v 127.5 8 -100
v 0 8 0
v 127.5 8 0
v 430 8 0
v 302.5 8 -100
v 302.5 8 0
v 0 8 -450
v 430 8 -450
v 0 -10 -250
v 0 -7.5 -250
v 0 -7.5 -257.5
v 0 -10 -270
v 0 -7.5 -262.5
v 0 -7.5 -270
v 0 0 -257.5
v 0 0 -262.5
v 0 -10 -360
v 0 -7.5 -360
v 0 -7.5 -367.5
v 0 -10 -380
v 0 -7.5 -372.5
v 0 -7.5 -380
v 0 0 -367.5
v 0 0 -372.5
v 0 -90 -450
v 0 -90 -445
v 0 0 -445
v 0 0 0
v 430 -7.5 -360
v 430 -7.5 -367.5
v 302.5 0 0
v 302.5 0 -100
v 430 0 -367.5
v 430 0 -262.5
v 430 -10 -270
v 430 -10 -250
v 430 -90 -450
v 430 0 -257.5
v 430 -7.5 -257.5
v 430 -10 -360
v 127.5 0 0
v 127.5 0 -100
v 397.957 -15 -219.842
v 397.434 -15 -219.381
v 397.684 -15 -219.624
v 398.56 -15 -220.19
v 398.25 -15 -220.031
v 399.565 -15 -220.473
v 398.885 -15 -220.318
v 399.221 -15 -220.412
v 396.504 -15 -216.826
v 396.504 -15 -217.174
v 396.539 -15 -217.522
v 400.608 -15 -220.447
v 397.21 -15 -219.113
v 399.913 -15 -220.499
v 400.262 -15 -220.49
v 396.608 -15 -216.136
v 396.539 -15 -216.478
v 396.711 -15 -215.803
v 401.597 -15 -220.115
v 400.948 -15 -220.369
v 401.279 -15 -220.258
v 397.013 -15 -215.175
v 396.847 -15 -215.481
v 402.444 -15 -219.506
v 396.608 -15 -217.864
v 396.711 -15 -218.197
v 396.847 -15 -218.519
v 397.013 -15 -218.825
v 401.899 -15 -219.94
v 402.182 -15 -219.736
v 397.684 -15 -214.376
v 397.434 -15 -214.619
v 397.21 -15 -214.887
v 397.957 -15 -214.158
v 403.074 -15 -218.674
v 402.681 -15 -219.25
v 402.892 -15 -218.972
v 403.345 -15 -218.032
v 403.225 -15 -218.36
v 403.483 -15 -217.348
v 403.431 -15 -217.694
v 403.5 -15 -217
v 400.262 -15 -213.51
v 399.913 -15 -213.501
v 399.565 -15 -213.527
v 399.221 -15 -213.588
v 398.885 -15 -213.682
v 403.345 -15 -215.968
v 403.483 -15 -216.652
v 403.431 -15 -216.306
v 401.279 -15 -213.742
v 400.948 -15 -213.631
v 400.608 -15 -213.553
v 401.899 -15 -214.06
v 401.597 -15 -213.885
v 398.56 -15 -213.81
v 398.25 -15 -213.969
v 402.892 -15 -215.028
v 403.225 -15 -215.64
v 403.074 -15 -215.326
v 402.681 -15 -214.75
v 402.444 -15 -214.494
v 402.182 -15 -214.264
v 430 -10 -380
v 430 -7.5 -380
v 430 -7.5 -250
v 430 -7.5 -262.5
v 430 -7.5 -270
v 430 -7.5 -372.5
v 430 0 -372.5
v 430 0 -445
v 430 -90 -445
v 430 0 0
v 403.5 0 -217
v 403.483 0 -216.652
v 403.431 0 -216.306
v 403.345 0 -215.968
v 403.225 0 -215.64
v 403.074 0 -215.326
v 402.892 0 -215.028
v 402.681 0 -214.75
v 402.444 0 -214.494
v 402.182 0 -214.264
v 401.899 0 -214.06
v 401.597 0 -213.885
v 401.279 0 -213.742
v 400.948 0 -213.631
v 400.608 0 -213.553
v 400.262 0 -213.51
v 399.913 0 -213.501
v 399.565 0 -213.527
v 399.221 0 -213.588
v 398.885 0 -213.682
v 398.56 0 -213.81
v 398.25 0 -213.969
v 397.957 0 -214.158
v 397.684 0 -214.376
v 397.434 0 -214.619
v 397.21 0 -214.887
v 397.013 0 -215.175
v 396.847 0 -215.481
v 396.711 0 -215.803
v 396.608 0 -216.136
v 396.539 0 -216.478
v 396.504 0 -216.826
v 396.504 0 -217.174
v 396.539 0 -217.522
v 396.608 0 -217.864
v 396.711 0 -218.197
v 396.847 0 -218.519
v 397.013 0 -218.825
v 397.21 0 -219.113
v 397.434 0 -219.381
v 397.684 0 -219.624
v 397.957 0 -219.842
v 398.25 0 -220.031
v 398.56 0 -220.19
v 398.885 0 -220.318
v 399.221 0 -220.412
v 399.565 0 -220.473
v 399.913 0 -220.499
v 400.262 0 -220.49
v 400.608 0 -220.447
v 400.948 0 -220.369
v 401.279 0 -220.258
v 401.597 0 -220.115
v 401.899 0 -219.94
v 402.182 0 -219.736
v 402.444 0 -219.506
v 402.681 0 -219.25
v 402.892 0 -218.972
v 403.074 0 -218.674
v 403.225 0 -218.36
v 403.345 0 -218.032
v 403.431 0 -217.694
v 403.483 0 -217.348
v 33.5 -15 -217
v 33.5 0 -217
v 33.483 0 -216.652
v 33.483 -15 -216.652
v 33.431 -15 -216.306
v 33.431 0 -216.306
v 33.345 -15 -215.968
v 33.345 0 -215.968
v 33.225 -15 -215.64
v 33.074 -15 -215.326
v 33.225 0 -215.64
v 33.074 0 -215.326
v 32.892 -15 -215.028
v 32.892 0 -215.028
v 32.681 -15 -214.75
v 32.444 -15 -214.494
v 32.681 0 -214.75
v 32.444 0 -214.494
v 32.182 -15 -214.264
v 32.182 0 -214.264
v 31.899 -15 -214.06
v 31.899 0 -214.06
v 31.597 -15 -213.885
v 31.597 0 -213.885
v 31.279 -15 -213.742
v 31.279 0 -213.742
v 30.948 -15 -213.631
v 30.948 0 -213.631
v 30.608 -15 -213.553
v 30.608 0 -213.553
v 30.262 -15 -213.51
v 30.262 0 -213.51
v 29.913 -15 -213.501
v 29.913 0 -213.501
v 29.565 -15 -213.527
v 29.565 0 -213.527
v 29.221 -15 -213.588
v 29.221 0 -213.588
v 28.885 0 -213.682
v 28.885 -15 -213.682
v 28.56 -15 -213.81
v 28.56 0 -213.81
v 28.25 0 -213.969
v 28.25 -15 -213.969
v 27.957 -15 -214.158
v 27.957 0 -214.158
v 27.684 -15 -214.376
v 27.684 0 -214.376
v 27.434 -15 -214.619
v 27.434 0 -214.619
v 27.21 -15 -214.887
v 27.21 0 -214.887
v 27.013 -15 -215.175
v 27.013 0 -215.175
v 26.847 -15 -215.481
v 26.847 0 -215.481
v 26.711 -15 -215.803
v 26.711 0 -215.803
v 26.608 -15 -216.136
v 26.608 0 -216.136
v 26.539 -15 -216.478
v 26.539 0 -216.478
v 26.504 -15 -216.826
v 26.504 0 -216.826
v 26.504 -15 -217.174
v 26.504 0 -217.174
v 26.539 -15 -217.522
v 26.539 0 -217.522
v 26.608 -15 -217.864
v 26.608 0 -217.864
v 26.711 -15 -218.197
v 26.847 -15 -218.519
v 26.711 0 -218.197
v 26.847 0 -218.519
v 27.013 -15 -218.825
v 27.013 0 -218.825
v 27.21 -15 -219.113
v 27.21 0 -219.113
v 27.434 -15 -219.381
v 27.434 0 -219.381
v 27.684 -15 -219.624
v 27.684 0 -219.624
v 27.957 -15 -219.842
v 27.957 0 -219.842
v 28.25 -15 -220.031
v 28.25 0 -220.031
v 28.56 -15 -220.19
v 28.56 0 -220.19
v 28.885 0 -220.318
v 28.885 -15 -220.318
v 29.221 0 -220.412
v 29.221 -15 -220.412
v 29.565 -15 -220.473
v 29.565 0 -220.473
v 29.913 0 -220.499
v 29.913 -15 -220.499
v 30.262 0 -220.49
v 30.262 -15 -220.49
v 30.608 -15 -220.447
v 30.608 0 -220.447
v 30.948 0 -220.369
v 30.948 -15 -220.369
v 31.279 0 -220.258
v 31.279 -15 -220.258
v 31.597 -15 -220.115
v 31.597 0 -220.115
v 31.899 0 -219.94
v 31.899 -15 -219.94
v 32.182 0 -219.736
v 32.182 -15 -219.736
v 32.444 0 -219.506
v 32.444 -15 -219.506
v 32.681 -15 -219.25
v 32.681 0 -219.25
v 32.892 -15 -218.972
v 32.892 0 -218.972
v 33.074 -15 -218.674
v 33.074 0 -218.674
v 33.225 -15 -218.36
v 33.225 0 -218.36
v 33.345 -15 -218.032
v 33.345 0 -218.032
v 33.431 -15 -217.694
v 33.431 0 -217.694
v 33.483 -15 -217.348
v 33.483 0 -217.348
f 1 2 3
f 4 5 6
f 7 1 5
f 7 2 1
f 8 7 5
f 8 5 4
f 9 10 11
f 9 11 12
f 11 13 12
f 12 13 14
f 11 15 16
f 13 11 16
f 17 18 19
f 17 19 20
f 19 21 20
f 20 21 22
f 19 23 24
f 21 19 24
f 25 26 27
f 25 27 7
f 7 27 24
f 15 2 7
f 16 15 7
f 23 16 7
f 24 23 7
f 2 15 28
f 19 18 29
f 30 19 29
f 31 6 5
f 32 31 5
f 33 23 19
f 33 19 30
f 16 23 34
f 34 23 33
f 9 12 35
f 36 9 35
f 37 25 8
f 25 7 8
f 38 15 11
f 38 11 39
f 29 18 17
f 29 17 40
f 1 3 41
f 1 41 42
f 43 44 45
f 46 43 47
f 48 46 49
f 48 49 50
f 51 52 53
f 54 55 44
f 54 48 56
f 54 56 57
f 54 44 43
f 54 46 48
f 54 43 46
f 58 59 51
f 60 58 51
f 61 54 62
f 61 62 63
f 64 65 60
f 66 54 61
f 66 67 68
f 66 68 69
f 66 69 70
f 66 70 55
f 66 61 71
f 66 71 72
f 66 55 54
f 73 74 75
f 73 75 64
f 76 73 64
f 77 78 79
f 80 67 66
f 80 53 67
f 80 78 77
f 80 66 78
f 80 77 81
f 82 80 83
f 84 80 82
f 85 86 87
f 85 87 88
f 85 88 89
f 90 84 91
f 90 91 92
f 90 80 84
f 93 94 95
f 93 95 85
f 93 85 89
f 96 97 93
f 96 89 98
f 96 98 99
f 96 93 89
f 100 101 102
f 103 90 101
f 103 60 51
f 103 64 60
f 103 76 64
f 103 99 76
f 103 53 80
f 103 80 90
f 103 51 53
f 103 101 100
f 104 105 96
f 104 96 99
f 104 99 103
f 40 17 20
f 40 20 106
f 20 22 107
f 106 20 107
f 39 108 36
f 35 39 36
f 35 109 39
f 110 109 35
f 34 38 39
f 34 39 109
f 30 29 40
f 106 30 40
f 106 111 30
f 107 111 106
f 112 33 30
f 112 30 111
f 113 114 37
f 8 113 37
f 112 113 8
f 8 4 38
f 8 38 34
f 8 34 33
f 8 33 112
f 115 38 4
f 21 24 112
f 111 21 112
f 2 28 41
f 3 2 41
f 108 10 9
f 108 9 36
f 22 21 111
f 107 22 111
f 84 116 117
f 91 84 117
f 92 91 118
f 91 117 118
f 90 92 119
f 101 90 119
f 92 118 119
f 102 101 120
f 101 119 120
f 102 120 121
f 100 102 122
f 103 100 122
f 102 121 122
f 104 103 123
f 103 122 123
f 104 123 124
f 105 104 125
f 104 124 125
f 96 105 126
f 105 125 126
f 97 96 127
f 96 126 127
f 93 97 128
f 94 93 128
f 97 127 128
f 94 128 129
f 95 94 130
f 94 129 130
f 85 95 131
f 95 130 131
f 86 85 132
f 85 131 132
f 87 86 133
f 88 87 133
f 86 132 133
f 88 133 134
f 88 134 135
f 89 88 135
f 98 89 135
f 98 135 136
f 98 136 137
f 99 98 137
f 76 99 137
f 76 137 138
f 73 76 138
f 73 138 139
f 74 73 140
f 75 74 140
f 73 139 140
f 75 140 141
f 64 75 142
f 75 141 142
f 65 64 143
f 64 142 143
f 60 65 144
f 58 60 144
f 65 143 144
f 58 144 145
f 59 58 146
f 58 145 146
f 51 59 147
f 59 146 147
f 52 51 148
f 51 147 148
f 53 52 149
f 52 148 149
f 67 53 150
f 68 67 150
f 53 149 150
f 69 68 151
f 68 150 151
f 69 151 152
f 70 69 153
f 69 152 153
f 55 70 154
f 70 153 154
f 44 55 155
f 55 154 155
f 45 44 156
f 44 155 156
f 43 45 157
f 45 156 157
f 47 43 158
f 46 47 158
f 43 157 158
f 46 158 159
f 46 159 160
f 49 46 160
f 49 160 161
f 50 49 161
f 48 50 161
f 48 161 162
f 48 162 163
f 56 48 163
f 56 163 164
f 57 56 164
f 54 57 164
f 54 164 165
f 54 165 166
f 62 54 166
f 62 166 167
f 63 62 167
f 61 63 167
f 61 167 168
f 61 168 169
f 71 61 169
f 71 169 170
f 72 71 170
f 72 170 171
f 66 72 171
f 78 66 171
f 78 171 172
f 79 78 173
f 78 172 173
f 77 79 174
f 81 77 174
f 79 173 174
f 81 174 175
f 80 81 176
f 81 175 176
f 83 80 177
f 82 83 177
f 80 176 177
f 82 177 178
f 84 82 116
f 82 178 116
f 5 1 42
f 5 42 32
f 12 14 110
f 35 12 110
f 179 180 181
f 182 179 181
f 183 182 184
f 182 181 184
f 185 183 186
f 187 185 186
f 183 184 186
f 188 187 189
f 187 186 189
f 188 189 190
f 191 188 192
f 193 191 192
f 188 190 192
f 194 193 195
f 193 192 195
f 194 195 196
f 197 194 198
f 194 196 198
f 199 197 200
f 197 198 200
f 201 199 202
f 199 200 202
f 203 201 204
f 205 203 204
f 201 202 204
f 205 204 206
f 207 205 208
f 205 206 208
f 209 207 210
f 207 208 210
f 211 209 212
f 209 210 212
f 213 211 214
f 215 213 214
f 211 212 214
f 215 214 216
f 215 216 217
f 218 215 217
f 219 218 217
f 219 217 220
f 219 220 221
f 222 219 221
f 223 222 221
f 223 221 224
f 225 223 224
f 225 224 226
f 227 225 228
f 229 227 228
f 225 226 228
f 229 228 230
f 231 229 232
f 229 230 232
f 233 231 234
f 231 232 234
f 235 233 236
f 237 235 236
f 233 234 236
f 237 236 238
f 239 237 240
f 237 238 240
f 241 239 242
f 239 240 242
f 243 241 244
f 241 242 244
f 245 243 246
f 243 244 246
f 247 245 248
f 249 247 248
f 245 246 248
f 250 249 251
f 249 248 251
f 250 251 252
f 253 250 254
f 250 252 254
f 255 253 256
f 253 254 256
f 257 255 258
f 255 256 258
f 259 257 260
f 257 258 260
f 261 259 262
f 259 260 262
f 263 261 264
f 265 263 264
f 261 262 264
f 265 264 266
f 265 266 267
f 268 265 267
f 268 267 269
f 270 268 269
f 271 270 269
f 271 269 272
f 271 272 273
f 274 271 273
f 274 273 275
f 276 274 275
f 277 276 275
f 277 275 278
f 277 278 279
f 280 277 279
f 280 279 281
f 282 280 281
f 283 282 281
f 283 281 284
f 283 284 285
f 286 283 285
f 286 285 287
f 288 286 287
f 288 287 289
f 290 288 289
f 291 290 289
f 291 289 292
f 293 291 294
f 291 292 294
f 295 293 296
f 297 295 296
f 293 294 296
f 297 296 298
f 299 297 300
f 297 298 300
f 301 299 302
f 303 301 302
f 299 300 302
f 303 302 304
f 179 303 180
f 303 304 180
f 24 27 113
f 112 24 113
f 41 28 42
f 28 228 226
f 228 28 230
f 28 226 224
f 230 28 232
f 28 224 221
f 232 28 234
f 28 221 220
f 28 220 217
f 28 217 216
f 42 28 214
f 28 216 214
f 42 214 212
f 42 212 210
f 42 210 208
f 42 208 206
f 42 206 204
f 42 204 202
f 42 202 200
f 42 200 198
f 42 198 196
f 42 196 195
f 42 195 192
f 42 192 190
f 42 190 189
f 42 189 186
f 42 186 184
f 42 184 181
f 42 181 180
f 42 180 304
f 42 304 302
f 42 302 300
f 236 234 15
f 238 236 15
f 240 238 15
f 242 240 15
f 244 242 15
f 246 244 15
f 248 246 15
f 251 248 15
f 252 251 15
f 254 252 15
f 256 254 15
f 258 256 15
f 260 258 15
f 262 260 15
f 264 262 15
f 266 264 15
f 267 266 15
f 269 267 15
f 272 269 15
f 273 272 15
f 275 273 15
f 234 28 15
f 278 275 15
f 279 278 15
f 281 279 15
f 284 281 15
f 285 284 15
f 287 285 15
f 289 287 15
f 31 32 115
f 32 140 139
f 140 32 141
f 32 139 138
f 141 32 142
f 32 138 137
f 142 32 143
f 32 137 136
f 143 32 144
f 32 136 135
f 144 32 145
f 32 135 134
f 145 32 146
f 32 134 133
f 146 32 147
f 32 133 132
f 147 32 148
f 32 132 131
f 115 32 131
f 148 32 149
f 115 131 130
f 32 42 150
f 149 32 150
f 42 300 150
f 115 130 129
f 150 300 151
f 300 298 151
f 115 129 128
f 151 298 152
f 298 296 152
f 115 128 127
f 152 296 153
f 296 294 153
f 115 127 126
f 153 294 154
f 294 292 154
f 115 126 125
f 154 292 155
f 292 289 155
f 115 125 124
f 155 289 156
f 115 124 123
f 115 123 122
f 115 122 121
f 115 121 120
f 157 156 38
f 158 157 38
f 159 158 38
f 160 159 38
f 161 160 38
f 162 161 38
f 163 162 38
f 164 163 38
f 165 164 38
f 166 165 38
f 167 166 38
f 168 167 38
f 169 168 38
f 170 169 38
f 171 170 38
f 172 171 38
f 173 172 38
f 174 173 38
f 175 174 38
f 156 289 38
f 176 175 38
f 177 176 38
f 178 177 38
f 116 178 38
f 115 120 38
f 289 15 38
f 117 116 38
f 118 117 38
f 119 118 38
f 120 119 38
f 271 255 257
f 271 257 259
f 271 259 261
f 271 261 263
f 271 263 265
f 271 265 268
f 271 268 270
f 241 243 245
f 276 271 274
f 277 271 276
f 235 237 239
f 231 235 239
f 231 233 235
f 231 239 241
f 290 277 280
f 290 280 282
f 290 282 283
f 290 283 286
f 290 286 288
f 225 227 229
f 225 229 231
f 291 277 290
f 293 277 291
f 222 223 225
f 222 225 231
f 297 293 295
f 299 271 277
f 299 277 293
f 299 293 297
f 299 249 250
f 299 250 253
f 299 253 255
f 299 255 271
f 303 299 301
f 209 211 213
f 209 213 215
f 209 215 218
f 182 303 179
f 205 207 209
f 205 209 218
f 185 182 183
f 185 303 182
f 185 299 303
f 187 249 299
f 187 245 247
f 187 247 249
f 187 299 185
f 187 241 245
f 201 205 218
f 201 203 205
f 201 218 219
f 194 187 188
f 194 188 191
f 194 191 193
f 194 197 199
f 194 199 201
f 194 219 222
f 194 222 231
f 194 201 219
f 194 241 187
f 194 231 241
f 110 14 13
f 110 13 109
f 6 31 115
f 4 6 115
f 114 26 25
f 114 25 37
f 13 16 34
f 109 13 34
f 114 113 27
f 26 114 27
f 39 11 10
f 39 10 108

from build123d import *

# Parameters (mm, degrees)
SKETCH1_W           = 430
SKETCH1_H           = 450
BOSS_EXTRUDE1_DEPTH = 8
SKETCH2_W           = 175
SKETCH2_H           = 100
CUT_EXTRUDE1_DEPTH  = 10
SKETCH4_R           = 3.5
BOSS_EXTRUDE3_DEPTH = 15
BOSS_EXTRUDE4_DEPTH = 90
SKETCH9_W           = 430
SKETCH9_H           = 5
BOSS_EXTRUDE6_DEPTH = 7.5
SKETCH10_W          = 430
SKETCH10_H          = 20
BOSS_EXTRUDE7_DEPTH = 2.5


with BuildPart() as part:
    # Sketch1 → Boss-Extrude1 (new body)
    with BuildSketch(Plane(origin=(0, 0, 0), x_dir=(1, 0, 0), z_dir=(0, 1, 0))):
        with Locations((215, 225)):
            Rectangle(SKETCH1_W, SKETCH1_H)
    extrude(amount=BOSS_EXTRUDE1_DEPTH)

    # Sketch2 → Cut-Extrude1 (cut)
    with BuildSketch(Plane(origin=(0, 8, 0), x_dir=(1, 0, 0), z_dir=(0, 1, 0))):
        with Locations((215, 50)):
            Rectangle(SKETCH2_W, SKETCH2_H)
    extrude(amount=-CUT_EXTRUDE1_DEPTH, mode=Mode.SUBTRACT)

    # Sketch4 → Boss-Extrude3 (add)
    with BuildSketch(Plane.XZ):
        with Locations((30, -217)):
            Circle(SKETCH4_R)
        with Locations((400, -217)):
            Circle(SKETCH4_R)
    extrude(amount=BOSS_EXTRUDE3_DEPTH)

    # Sketch5 → Boss-Extrude4 (add)
    with BuildSketch(Plane.XZ):
        Polygon((5.000626144, -445), (0, -445), (0, -450), (430, -450), (430, -445), (429.008283612, -445), align=None)
    extrude(amount=BOSS_EXTRUDE4_DEPTH)

    # Sketch9 → Boss-Extrude6 (add)
    with BuildSketch(Plane.XZ):
        with Locations((215, -370)):
            Rectangle(SKETCH9_W, SKETCH9_H)
    boss_extrude6 = extrude(amount=BOSS_EXTRUDE6_DEPTH)

    # Sketch10 → Boss-Extrude7 (add)
    with BuildSketch(Plane.XZ.offset(7.5)):
        with Locations((215, -370)):
            Rectangle(SKETCH10_W, SKETCH10_H)
    boss_extrude7 = extrude(amount=BOSS_EXTRUDE7_DEPTH)

    # Mirror9: Boss-Extrude6, Boss-Extrude7 across plane
    add(boss_extrude6.mirror(Plane.XY.offset(-315)))
    add(boss_extrude7.mirror(Plane.XY.offset(-315)))


solid = part.part
